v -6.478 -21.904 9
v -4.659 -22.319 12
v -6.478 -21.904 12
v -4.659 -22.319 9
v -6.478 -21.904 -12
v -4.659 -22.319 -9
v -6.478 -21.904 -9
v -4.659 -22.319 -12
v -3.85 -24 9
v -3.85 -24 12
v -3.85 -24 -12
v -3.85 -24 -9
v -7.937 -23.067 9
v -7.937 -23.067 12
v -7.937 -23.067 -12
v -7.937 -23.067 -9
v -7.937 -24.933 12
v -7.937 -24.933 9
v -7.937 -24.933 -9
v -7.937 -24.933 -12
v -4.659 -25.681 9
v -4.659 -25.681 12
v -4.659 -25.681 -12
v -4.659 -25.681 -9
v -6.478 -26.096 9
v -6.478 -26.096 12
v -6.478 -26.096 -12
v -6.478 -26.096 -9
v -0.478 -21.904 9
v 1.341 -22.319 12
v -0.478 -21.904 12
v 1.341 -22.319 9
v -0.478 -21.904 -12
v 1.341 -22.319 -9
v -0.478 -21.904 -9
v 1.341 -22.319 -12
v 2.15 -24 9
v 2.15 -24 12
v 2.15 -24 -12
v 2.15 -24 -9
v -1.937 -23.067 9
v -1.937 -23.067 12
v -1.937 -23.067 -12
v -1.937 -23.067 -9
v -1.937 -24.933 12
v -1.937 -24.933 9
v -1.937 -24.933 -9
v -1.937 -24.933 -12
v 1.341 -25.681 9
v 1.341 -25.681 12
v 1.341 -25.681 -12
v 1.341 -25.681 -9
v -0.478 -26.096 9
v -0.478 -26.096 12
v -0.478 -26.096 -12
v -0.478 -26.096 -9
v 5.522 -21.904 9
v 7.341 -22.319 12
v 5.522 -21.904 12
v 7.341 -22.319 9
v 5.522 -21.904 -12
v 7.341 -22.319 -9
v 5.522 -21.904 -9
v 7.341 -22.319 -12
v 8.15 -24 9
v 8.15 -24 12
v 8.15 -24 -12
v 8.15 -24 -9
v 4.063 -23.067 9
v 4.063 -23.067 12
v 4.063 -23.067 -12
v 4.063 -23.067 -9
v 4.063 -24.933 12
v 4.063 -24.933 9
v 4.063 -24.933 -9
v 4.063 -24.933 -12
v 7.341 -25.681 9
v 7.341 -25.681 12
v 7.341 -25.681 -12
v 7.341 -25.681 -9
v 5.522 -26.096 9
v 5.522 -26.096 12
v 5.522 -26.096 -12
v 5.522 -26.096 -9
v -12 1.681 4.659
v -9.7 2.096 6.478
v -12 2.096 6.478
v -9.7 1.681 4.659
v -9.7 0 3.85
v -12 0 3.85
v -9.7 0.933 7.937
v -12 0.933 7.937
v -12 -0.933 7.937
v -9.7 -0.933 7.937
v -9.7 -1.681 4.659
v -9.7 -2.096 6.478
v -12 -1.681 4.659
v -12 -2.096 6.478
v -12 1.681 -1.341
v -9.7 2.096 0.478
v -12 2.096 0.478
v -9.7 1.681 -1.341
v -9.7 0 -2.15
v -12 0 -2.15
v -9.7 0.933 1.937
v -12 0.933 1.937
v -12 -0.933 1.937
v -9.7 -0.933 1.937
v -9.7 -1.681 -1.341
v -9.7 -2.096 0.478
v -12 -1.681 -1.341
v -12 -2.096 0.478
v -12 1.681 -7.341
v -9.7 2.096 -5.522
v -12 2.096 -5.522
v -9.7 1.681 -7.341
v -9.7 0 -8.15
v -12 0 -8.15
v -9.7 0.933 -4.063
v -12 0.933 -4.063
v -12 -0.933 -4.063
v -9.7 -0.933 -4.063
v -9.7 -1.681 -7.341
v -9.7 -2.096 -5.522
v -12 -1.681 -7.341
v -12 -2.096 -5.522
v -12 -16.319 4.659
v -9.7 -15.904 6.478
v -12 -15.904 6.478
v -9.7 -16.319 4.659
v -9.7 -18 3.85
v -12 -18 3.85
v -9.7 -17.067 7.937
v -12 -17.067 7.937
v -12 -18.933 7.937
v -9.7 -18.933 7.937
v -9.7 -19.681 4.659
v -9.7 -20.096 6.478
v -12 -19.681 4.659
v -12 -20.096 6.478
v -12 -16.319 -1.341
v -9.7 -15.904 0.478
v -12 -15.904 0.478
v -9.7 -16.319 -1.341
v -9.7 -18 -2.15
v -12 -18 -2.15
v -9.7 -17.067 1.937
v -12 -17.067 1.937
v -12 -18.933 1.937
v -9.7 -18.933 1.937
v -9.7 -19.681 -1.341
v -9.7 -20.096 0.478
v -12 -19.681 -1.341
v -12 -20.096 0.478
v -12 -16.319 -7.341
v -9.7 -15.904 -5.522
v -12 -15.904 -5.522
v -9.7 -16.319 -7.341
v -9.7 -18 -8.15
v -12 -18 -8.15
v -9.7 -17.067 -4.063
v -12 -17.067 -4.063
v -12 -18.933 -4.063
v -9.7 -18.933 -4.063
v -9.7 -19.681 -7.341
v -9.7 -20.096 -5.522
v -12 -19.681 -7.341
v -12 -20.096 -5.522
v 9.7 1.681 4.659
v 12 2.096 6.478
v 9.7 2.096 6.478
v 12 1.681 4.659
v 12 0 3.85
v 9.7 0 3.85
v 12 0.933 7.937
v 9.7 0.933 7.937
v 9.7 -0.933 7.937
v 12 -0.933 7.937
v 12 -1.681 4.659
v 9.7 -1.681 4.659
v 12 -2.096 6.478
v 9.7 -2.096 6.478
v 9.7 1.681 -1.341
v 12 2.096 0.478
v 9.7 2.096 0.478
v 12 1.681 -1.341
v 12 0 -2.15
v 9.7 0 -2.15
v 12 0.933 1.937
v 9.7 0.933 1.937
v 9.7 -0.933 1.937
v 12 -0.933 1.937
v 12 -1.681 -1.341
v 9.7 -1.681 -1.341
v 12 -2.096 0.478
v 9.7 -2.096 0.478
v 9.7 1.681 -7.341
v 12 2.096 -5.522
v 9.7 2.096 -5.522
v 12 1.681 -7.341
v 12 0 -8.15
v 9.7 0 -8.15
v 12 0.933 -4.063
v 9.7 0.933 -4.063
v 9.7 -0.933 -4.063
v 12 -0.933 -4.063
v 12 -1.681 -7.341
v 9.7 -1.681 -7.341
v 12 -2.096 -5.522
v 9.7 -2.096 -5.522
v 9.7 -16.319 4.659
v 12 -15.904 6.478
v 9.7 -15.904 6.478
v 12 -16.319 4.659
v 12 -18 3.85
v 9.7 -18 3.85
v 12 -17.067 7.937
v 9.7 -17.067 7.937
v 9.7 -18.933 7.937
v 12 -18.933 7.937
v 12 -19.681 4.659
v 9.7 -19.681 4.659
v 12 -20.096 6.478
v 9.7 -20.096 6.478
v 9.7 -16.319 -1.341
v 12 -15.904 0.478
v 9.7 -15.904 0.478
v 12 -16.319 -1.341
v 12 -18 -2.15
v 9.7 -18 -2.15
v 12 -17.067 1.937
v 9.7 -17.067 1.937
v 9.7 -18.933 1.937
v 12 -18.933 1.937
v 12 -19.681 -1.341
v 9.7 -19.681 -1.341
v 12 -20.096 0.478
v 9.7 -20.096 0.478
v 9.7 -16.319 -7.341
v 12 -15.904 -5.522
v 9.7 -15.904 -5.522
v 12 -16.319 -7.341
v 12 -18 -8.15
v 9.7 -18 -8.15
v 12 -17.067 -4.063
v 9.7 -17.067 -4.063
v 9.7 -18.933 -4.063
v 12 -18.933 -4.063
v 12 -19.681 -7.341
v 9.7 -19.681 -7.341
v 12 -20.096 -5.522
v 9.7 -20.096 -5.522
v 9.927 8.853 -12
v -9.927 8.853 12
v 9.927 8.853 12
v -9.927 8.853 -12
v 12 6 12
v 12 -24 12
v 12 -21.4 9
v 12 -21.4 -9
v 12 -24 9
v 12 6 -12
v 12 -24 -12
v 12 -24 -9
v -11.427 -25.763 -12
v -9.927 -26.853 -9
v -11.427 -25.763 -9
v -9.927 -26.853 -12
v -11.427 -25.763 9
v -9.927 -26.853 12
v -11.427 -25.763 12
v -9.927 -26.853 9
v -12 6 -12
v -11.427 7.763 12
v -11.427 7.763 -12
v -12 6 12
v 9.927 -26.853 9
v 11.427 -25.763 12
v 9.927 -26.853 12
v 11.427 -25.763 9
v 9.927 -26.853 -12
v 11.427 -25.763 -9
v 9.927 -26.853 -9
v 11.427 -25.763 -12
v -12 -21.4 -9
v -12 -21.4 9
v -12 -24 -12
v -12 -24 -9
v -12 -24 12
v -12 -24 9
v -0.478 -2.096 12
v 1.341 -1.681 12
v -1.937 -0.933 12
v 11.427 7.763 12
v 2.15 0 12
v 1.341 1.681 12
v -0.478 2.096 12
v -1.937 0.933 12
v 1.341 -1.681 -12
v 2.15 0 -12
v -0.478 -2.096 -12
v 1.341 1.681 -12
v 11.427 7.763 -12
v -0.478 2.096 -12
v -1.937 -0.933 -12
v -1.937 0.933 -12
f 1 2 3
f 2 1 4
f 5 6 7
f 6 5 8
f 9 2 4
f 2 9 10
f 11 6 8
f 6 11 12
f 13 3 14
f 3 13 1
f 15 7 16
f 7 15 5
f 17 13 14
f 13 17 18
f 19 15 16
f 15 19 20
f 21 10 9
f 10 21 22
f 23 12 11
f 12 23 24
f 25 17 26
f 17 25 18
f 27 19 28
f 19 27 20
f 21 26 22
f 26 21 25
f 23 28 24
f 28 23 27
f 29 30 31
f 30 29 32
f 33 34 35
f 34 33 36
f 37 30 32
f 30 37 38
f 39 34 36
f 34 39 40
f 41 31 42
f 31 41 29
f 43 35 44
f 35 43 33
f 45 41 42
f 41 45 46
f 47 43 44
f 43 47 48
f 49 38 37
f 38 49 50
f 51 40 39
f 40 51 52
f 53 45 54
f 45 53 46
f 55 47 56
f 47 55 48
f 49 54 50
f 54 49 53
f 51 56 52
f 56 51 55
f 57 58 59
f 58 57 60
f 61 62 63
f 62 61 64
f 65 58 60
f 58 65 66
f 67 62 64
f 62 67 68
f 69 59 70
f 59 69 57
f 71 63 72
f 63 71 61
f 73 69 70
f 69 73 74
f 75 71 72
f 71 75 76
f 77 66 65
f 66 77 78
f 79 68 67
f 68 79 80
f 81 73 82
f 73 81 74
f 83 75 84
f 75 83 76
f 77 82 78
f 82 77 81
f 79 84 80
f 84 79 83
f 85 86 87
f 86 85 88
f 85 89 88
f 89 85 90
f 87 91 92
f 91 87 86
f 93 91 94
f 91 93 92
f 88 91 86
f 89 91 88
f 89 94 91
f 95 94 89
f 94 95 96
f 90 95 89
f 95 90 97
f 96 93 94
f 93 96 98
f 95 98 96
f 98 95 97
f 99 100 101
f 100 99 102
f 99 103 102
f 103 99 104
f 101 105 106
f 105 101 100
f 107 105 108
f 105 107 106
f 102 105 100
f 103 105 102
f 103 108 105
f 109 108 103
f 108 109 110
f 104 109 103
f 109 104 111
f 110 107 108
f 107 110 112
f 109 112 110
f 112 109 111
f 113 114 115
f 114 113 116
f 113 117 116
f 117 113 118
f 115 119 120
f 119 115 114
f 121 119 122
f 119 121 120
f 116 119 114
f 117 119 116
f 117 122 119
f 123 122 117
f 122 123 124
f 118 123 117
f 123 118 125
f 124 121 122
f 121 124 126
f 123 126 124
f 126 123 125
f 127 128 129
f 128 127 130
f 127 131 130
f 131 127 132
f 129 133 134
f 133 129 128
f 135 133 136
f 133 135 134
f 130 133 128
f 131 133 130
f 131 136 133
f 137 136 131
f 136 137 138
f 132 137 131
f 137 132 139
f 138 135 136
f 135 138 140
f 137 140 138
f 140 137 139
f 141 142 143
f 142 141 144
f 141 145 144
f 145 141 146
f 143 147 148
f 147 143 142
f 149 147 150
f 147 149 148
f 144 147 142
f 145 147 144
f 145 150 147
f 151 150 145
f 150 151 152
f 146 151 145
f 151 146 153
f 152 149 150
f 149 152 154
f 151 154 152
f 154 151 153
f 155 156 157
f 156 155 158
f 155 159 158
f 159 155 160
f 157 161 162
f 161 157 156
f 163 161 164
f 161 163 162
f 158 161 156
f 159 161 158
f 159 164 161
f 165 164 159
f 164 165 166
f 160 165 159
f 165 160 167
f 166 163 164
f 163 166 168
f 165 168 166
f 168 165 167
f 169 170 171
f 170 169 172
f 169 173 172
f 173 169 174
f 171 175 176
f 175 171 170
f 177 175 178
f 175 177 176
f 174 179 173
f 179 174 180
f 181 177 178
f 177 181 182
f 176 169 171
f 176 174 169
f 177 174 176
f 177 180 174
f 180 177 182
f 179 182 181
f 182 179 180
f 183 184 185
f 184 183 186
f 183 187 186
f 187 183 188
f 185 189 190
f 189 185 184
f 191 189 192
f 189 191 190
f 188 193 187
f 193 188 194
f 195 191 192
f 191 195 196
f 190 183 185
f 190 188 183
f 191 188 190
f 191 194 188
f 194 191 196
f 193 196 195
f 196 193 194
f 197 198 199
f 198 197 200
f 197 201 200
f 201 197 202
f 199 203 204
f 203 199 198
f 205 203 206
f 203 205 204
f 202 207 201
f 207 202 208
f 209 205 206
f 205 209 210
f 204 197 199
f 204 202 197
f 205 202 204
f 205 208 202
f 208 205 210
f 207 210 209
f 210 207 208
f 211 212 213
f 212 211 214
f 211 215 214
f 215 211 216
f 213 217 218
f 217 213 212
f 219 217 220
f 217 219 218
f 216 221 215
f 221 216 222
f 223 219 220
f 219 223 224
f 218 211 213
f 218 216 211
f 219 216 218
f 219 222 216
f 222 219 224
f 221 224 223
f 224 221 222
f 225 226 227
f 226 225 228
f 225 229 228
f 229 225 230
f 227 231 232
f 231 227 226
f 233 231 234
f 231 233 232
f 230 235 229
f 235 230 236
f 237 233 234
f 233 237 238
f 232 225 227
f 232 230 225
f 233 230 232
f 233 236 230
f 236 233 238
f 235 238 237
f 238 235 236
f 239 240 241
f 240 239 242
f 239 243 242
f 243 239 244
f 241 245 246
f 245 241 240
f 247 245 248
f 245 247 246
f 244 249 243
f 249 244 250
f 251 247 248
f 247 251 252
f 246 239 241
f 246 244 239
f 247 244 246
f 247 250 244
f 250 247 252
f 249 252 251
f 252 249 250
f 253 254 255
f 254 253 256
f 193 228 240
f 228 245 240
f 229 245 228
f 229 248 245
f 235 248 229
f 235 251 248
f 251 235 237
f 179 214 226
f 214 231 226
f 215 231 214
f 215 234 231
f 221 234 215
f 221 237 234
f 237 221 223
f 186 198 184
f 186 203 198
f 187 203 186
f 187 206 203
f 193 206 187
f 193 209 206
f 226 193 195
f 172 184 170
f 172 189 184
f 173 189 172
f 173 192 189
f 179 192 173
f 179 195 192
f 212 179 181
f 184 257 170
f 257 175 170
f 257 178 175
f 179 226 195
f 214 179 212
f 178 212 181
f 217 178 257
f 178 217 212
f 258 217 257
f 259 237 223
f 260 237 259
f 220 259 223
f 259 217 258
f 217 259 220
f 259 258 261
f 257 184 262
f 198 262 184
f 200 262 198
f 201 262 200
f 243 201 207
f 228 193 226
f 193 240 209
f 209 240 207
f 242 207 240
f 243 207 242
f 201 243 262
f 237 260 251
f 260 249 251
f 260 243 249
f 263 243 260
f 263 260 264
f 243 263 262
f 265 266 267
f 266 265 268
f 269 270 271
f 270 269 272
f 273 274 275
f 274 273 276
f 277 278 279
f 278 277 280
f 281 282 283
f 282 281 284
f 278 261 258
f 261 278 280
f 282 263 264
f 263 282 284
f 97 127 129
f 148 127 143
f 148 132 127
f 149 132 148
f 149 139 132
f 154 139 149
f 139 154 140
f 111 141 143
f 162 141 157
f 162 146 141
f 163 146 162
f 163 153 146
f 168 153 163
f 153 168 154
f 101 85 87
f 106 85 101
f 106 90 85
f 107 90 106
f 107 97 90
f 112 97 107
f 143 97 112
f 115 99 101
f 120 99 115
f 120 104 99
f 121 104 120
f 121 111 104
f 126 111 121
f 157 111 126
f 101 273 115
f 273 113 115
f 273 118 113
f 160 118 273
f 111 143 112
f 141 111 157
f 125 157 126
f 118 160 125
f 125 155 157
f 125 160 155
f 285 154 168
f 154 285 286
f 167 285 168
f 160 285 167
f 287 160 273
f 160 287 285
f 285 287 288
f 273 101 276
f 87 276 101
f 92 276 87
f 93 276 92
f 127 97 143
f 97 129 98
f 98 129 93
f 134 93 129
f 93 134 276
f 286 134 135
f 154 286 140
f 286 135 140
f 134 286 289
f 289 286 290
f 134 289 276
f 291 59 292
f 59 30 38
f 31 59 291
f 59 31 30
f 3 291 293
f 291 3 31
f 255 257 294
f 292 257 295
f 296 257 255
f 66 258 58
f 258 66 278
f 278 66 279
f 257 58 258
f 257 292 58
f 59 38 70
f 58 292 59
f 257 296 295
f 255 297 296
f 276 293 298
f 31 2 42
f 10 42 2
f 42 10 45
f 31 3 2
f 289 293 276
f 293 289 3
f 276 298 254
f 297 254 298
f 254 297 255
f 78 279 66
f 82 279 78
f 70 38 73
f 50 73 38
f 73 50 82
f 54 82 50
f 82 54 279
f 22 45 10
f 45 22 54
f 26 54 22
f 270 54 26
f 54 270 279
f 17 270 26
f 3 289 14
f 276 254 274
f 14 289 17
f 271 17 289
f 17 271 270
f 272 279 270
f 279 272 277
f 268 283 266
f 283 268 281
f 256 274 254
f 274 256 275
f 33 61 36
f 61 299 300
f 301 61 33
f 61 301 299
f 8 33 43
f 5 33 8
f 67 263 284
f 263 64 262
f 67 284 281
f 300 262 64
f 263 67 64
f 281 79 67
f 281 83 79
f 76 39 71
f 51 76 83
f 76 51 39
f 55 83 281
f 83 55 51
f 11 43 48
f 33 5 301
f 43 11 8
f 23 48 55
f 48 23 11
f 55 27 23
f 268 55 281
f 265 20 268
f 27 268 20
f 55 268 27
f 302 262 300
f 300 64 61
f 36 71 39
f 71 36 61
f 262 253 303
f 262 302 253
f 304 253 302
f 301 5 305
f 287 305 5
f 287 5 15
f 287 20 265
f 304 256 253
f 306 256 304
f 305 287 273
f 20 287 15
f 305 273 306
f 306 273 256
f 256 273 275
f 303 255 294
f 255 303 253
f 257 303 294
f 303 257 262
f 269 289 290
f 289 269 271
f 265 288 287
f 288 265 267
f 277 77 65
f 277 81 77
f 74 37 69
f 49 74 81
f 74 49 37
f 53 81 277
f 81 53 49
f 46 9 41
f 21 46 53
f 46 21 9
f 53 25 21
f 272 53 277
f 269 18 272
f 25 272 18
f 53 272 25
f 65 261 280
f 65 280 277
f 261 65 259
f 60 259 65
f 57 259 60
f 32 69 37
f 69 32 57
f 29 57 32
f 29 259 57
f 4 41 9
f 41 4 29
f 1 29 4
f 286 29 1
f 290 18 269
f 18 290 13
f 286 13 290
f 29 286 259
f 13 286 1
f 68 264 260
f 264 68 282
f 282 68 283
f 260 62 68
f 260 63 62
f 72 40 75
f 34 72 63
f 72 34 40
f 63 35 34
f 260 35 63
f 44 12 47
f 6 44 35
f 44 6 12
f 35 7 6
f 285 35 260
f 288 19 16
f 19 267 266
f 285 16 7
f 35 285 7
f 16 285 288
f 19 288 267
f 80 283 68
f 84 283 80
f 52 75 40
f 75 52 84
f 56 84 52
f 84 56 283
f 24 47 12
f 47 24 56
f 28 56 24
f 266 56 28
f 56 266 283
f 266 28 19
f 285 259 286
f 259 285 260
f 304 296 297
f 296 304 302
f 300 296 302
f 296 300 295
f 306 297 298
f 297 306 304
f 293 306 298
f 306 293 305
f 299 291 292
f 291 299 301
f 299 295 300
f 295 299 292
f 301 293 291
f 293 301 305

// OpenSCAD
// file: ../util/rounded.scad
// Do a rounded cube
module rounded(x=10, y=10, z=10, r=3, center=false) {
  if (center) {
    translate([-(x/2),-(y/2),0])
      rounded(x, y, z, r);
  } else {
    translate([r,r,0])
    minkowski() {
      cube([x-2*r,y-2*r,z/2]);
      cylinder(h=z/2, r=r);
    }
  }
}
// file: motor_values.scad
// Motor dimensions
MotorWidth = 24; 
MotorHeight = 36; 
MotorDepth = 24; 
MotorArmOffset = 9;
// file: ollo.scad
// Diameter of plastic ollo holes
OlloHoles = 4.3;

// Width of Ollo "real" plastic
OlloWidth = 3;

// Distance between two ollo holes
OlloSpacing = 6;

// Do an Ollo hole on the part
module olloHole(depth=2.2)
{
    translate([0,0,-0.1])
      cylinder(depth+0.2, OlloHoles/2, OlloHoles/2);
}

// Do 3 ollo holes
module threeOllo(depth=2.2)
{
  for (xy=[[-OlloSpacing,0],[0,0],[OlloSpacing,0]]) {
    translate([xy[0], xy[1], 0])
    olloHole(depth);
  }
}

// Do a servo arm holes
module servoArm(depth=2.2)
{
    threeOllo(depth);
    rotate([0,0,90])
      threeOllo(depth);
}
// main file
include <ollo.scad>;
include <motor_values.scad>;
use <../util/rounded.scad>;

module motor(thickness=2.2) {
  translate([0,-MotorArmOffset,-MotorDepth/2]) {
  color([0.25,0.25,0.25]) {
	 difference() {
  	   rounded(MotorWidth,MotorHeight,MotorDepth,3,center=true);

		// Bottom
      translate([-MotorWidth/2-0.1,-MotorHeight/2-0.1,3])
	     cube([MotorWidth+0.2, 5.7, MotorDepth-6]);

		translate([0,-MotorHeight/2+3])
		  threeOllo(MotorDepth);

		// Motor shaft
	   translate([0, MotorArmOffset])
     	  olloHole(MotorDepth+5);

		// Side holes
		for (side=[-MotorWidth/2,MotorWidth/2-thickness]) {
		translate([side,9,MotorDepth/2]) {
		  rotate([0,90,0]) {
		   threeOllo();
			translate([0,-3*OlloSpacing,0])
			  threeOllo();
		  }
		}
		}
	 }
  }
	}
}

motor();
